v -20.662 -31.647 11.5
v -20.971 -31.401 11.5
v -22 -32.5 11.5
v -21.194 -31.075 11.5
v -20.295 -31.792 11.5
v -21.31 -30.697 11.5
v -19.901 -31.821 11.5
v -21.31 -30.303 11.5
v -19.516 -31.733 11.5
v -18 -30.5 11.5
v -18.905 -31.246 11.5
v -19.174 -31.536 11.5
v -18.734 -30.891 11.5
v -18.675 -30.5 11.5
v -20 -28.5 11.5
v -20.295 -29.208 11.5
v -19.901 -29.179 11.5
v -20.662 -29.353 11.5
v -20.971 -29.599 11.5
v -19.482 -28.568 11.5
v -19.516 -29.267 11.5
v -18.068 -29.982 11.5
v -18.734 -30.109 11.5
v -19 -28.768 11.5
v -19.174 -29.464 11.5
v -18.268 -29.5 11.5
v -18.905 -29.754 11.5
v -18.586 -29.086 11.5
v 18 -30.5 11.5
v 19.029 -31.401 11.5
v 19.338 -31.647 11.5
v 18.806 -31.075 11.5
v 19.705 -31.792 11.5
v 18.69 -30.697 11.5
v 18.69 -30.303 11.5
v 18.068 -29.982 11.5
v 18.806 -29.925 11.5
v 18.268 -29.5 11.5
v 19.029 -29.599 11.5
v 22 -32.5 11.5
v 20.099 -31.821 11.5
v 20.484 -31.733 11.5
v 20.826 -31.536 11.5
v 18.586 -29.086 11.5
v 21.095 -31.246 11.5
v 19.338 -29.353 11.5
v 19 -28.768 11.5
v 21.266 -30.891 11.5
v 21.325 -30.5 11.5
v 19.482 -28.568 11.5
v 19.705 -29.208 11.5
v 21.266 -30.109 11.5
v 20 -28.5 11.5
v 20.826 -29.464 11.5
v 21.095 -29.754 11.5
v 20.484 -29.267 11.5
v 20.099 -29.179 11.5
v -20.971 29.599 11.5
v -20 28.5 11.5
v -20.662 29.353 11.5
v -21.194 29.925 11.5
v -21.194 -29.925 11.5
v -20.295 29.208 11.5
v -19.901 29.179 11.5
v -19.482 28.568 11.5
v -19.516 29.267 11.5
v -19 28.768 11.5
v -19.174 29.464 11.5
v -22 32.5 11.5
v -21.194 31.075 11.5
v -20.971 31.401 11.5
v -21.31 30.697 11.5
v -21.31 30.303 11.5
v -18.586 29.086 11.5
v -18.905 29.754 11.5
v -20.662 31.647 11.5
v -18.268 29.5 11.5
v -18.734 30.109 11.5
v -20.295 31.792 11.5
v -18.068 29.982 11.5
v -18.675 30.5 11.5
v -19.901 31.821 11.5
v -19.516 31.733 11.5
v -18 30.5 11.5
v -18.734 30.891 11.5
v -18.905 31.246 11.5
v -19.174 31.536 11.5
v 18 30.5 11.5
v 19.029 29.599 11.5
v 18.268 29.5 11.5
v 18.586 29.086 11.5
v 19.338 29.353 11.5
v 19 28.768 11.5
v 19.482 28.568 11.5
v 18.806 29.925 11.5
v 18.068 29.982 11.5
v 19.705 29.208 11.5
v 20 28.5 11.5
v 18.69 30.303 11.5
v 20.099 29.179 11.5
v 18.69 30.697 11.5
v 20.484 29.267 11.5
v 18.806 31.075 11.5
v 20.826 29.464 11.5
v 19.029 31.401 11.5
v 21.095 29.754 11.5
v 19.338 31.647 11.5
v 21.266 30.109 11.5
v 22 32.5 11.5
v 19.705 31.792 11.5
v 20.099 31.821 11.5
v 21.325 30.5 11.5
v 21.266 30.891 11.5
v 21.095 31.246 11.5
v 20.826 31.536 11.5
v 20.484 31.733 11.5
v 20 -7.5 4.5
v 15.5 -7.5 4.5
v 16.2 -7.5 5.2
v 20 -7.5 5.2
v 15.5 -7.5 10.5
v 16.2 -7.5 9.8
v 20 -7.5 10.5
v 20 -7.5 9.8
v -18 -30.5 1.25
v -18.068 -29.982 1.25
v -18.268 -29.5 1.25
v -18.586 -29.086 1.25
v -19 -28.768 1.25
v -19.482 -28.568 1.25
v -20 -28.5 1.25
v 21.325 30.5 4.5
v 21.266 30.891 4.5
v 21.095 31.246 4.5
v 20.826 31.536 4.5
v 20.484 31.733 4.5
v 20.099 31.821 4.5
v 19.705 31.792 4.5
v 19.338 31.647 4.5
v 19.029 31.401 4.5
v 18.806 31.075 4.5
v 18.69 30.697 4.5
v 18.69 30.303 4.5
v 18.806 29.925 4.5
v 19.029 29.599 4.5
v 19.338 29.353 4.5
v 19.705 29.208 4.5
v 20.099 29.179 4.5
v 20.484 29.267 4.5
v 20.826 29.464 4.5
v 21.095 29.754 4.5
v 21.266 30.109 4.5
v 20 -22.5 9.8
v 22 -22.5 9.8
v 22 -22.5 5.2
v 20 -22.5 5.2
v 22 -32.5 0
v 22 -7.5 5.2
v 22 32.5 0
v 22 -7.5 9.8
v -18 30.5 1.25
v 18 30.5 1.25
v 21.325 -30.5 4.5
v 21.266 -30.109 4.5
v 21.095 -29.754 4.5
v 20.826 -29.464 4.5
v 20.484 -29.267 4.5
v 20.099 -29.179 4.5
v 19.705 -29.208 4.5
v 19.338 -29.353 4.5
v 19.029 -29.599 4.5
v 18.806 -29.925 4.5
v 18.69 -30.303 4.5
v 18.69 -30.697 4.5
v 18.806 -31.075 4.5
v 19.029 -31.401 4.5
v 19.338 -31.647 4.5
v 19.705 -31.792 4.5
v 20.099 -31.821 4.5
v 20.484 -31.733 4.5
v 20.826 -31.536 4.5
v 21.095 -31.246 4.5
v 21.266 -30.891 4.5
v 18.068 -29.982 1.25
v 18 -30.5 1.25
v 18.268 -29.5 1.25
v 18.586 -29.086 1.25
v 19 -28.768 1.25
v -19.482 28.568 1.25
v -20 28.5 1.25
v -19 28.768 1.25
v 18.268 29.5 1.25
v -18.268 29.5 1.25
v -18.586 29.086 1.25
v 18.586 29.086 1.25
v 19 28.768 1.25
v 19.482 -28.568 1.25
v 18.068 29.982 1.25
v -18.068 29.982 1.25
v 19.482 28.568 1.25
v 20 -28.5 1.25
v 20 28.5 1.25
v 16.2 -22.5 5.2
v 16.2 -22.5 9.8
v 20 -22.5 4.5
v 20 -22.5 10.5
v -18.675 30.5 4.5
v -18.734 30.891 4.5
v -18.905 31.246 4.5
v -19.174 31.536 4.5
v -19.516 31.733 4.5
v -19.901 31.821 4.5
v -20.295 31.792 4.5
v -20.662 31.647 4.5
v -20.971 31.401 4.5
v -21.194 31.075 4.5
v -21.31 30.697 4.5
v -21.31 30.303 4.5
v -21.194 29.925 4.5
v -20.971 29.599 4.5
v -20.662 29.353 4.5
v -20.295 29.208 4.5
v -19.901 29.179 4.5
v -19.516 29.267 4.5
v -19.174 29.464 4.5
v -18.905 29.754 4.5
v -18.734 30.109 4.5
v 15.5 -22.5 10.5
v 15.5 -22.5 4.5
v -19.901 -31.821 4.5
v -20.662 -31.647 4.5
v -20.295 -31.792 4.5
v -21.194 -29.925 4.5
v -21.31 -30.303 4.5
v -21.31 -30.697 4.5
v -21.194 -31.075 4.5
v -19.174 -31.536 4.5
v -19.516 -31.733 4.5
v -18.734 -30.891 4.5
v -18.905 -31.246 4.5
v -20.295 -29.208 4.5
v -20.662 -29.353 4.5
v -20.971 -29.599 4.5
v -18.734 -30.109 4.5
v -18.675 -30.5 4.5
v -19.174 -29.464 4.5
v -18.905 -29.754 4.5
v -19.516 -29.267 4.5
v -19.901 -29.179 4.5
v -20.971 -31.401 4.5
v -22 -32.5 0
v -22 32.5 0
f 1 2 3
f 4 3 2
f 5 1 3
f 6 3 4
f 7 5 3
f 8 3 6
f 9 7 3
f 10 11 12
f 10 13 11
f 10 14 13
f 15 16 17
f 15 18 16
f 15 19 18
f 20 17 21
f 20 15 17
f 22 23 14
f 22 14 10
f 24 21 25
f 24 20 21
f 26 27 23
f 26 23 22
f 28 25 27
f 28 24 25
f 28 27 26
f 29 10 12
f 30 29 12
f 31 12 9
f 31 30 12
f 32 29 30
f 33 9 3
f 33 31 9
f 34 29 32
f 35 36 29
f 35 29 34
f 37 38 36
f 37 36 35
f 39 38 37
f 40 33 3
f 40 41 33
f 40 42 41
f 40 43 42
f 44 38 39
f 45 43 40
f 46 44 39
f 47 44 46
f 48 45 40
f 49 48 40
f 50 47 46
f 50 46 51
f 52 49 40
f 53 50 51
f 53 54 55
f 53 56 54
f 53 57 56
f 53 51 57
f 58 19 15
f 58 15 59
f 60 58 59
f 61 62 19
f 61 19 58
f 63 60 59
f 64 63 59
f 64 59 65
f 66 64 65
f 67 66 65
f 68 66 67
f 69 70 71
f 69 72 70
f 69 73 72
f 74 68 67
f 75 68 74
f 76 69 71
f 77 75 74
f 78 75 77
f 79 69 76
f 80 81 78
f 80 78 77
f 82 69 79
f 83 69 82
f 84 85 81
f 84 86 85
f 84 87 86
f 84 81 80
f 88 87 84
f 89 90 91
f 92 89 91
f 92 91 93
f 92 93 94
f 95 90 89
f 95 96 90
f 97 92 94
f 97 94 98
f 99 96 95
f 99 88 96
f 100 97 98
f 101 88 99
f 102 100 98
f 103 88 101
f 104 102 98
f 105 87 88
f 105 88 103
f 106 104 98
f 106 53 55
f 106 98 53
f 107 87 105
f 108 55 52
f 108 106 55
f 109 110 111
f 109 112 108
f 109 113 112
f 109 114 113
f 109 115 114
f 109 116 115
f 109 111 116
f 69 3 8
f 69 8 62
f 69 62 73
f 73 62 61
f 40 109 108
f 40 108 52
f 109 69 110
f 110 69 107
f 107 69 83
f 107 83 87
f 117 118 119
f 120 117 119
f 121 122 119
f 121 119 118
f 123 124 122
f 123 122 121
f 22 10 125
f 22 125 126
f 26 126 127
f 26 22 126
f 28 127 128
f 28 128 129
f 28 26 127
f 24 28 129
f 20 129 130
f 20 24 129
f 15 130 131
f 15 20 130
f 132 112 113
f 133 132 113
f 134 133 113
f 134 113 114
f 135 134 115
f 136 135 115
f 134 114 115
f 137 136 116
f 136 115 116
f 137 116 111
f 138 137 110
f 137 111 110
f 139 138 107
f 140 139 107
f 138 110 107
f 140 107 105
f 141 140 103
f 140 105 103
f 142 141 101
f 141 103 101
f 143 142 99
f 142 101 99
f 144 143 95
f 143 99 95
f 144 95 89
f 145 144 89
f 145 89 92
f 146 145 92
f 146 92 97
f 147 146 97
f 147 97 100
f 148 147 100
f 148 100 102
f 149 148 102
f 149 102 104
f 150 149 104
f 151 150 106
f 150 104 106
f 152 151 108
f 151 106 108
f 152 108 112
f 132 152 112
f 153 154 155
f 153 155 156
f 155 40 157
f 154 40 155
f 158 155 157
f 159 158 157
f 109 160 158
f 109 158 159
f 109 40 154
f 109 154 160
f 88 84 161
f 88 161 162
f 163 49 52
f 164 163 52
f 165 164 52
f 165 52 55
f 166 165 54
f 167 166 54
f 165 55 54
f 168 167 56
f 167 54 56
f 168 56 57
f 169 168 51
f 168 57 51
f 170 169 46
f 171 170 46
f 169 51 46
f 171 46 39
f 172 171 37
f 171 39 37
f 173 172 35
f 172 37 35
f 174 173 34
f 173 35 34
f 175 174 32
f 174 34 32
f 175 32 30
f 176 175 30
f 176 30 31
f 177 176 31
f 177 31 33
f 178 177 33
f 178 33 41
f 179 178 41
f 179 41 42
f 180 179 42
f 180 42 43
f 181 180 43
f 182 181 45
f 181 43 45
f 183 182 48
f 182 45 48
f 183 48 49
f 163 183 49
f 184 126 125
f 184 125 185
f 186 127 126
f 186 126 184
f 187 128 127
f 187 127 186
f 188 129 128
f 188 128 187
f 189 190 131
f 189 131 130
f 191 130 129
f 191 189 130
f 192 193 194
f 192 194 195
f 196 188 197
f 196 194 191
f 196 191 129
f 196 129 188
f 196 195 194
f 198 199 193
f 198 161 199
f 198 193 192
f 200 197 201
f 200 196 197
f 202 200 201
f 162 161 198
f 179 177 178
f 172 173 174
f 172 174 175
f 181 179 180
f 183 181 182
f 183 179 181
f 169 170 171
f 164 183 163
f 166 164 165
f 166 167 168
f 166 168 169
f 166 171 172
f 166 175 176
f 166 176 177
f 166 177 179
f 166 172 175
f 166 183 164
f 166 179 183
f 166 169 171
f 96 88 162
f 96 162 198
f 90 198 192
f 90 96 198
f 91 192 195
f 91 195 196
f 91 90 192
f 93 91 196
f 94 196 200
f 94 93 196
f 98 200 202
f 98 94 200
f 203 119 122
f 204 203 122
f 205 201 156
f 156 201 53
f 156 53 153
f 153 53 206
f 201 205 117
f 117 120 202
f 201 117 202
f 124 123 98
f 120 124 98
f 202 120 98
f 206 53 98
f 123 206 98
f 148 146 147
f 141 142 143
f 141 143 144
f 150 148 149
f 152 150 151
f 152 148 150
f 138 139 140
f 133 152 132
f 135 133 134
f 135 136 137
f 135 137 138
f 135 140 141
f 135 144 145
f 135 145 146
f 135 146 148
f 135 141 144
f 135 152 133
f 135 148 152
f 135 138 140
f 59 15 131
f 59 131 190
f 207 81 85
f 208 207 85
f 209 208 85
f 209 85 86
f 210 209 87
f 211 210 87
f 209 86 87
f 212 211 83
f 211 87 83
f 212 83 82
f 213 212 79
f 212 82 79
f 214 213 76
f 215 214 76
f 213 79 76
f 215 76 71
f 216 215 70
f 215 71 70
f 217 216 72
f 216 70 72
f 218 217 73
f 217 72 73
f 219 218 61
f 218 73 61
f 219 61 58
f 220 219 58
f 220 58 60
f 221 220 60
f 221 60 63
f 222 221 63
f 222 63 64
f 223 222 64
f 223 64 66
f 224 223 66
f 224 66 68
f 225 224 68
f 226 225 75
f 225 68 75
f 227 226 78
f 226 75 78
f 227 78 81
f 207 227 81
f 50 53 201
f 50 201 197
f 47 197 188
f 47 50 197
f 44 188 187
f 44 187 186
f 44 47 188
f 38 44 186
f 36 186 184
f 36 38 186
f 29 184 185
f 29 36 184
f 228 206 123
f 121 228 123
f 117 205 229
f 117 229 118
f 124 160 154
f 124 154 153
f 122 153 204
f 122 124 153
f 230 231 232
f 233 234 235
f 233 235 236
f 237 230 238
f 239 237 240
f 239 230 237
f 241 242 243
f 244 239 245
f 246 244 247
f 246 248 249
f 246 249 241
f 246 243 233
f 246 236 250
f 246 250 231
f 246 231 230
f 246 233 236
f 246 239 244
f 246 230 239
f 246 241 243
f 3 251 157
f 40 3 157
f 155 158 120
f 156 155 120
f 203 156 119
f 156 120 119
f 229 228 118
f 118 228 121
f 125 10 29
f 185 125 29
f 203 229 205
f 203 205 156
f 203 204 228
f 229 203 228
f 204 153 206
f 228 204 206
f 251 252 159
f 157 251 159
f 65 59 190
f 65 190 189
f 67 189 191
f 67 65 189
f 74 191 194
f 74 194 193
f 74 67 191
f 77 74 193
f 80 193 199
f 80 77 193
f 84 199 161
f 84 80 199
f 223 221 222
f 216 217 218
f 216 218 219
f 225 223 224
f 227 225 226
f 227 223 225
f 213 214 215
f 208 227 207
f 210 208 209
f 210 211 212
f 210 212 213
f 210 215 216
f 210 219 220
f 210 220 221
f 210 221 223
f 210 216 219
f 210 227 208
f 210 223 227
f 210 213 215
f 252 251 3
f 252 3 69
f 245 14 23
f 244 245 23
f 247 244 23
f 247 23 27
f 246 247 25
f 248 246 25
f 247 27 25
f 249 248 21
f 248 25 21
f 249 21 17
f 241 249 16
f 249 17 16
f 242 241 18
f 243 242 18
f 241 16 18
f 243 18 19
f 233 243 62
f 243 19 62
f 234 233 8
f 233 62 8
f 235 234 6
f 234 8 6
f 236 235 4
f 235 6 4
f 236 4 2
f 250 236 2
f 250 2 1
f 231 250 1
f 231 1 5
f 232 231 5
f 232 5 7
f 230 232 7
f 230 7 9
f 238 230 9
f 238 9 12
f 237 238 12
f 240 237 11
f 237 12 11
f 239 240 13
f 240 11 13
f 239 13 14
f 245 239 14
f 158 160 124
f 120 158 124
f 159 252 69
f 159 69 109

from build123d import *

# Parameters (mm, degrees)
F0_W      = 44
F0_H      = 65
F1_DEPTH  = 11.5
F2_W      = 40
F2_H      = 61
F3_DEPTH  = 10.25
F5_DEPTH  = 11
F6_R      = 1.325
F7_DEPTH  = 7
F10_W     = 15
F10_H     = 6
F11_DEPTH = 6.5
F12_W     = 7
F12_H     = 4.6
F13_DEPTH = 15


with BuildPart() as f1:
    # F0 (on Top) → F1 (new body)
    with BuildSketch(Plane.XY):
        Rectangle(F0_W, F0_H)
    extrude(amount=F1_DEPTH)

    # F2 (on face) → F3 (cut)
    with BuildSketch(Plane.XY.offset(11.5)):
        Rectangle(F2_W, F2_H)
    extrude(amount=-F3_DEPTH, mode=Mode.SUBTRACT)

    # F4 (on face) → F5 (join)
    with BuildSketch(Plane.XY.offset(11.5)):
        with BuildLine():
            Line((20, -30.5), (20, -28.5))
            ThreePointArc((20, -28.5), (18.5857864376, -29.0857864376), (18, -30.5))
            Line((18, -30.5), (20, -30.5))
        make_face()
        with BuildLine():
            ThreePointArc((-18, -30.5), (-18.5857864376, -29.0857864376), (-20, -28.5))
            Line((-20, -28.5), (-20, -30.5))
            Line((-20, -30.5), (-18, -30.5))
        make_face()
        with BuildLine():
            Line((20, 30.5), (18, 30.5))
            ThreePointArc((18, 30.5), (18.5857864376, 29.0857864376), (20, 28.5))
            Line((20, 28.5), (20, 30.5))
        make_face()
        with BuildLine():
            ThreePointArc((-20, 28.5), (-18.5857864376, 29.0857864376), (-18, 30.5))
            Line((-18, 30.5), (-20, 30.5))
            Line((-20, 30.5), (-20, 28.5))
        make_face()
    extrude(amount=-F5_DEPTH)

    # F6 (on face) → F7 (cut)
    with BuildSketch(Plane.XY.offset(11.5)):
        with Locations((-20, -30.5)):
            Circle(F6_R)
        with Locations((-20, 30.5)):
            Circle(F6_R)
        with Locations((20, 30.5)):
            Circle(F6_R)
        with Locations((20, -30.5)):
            Circle(F6_R)
    extrude(amount=-F7_DEPTH, mode=Mode.SUBTRACT)

    # F10 (on face) → F11 (join)
    with BuildSketch(Plane.YZ.offset(22)):
        with Locations((-15, 7.5)):
            Rectangle(F10_W, F10_H)
    extrude(amount=-F11_DEPTH)

    # F12 (on face) → F13 (cut)
    with BuildSketch(Plane(origin=(0, -7.5, 0), x_dir=(-1, 0, 0), z_dir=(0, 1, 0))):
        with Locations((-19.7, 7.5)):
            Rectangle(F12_W, F12_H)
    extrude(amount=-F13_DEPTH, mode=Mode.SUBTRACT)


solid = f1.part
